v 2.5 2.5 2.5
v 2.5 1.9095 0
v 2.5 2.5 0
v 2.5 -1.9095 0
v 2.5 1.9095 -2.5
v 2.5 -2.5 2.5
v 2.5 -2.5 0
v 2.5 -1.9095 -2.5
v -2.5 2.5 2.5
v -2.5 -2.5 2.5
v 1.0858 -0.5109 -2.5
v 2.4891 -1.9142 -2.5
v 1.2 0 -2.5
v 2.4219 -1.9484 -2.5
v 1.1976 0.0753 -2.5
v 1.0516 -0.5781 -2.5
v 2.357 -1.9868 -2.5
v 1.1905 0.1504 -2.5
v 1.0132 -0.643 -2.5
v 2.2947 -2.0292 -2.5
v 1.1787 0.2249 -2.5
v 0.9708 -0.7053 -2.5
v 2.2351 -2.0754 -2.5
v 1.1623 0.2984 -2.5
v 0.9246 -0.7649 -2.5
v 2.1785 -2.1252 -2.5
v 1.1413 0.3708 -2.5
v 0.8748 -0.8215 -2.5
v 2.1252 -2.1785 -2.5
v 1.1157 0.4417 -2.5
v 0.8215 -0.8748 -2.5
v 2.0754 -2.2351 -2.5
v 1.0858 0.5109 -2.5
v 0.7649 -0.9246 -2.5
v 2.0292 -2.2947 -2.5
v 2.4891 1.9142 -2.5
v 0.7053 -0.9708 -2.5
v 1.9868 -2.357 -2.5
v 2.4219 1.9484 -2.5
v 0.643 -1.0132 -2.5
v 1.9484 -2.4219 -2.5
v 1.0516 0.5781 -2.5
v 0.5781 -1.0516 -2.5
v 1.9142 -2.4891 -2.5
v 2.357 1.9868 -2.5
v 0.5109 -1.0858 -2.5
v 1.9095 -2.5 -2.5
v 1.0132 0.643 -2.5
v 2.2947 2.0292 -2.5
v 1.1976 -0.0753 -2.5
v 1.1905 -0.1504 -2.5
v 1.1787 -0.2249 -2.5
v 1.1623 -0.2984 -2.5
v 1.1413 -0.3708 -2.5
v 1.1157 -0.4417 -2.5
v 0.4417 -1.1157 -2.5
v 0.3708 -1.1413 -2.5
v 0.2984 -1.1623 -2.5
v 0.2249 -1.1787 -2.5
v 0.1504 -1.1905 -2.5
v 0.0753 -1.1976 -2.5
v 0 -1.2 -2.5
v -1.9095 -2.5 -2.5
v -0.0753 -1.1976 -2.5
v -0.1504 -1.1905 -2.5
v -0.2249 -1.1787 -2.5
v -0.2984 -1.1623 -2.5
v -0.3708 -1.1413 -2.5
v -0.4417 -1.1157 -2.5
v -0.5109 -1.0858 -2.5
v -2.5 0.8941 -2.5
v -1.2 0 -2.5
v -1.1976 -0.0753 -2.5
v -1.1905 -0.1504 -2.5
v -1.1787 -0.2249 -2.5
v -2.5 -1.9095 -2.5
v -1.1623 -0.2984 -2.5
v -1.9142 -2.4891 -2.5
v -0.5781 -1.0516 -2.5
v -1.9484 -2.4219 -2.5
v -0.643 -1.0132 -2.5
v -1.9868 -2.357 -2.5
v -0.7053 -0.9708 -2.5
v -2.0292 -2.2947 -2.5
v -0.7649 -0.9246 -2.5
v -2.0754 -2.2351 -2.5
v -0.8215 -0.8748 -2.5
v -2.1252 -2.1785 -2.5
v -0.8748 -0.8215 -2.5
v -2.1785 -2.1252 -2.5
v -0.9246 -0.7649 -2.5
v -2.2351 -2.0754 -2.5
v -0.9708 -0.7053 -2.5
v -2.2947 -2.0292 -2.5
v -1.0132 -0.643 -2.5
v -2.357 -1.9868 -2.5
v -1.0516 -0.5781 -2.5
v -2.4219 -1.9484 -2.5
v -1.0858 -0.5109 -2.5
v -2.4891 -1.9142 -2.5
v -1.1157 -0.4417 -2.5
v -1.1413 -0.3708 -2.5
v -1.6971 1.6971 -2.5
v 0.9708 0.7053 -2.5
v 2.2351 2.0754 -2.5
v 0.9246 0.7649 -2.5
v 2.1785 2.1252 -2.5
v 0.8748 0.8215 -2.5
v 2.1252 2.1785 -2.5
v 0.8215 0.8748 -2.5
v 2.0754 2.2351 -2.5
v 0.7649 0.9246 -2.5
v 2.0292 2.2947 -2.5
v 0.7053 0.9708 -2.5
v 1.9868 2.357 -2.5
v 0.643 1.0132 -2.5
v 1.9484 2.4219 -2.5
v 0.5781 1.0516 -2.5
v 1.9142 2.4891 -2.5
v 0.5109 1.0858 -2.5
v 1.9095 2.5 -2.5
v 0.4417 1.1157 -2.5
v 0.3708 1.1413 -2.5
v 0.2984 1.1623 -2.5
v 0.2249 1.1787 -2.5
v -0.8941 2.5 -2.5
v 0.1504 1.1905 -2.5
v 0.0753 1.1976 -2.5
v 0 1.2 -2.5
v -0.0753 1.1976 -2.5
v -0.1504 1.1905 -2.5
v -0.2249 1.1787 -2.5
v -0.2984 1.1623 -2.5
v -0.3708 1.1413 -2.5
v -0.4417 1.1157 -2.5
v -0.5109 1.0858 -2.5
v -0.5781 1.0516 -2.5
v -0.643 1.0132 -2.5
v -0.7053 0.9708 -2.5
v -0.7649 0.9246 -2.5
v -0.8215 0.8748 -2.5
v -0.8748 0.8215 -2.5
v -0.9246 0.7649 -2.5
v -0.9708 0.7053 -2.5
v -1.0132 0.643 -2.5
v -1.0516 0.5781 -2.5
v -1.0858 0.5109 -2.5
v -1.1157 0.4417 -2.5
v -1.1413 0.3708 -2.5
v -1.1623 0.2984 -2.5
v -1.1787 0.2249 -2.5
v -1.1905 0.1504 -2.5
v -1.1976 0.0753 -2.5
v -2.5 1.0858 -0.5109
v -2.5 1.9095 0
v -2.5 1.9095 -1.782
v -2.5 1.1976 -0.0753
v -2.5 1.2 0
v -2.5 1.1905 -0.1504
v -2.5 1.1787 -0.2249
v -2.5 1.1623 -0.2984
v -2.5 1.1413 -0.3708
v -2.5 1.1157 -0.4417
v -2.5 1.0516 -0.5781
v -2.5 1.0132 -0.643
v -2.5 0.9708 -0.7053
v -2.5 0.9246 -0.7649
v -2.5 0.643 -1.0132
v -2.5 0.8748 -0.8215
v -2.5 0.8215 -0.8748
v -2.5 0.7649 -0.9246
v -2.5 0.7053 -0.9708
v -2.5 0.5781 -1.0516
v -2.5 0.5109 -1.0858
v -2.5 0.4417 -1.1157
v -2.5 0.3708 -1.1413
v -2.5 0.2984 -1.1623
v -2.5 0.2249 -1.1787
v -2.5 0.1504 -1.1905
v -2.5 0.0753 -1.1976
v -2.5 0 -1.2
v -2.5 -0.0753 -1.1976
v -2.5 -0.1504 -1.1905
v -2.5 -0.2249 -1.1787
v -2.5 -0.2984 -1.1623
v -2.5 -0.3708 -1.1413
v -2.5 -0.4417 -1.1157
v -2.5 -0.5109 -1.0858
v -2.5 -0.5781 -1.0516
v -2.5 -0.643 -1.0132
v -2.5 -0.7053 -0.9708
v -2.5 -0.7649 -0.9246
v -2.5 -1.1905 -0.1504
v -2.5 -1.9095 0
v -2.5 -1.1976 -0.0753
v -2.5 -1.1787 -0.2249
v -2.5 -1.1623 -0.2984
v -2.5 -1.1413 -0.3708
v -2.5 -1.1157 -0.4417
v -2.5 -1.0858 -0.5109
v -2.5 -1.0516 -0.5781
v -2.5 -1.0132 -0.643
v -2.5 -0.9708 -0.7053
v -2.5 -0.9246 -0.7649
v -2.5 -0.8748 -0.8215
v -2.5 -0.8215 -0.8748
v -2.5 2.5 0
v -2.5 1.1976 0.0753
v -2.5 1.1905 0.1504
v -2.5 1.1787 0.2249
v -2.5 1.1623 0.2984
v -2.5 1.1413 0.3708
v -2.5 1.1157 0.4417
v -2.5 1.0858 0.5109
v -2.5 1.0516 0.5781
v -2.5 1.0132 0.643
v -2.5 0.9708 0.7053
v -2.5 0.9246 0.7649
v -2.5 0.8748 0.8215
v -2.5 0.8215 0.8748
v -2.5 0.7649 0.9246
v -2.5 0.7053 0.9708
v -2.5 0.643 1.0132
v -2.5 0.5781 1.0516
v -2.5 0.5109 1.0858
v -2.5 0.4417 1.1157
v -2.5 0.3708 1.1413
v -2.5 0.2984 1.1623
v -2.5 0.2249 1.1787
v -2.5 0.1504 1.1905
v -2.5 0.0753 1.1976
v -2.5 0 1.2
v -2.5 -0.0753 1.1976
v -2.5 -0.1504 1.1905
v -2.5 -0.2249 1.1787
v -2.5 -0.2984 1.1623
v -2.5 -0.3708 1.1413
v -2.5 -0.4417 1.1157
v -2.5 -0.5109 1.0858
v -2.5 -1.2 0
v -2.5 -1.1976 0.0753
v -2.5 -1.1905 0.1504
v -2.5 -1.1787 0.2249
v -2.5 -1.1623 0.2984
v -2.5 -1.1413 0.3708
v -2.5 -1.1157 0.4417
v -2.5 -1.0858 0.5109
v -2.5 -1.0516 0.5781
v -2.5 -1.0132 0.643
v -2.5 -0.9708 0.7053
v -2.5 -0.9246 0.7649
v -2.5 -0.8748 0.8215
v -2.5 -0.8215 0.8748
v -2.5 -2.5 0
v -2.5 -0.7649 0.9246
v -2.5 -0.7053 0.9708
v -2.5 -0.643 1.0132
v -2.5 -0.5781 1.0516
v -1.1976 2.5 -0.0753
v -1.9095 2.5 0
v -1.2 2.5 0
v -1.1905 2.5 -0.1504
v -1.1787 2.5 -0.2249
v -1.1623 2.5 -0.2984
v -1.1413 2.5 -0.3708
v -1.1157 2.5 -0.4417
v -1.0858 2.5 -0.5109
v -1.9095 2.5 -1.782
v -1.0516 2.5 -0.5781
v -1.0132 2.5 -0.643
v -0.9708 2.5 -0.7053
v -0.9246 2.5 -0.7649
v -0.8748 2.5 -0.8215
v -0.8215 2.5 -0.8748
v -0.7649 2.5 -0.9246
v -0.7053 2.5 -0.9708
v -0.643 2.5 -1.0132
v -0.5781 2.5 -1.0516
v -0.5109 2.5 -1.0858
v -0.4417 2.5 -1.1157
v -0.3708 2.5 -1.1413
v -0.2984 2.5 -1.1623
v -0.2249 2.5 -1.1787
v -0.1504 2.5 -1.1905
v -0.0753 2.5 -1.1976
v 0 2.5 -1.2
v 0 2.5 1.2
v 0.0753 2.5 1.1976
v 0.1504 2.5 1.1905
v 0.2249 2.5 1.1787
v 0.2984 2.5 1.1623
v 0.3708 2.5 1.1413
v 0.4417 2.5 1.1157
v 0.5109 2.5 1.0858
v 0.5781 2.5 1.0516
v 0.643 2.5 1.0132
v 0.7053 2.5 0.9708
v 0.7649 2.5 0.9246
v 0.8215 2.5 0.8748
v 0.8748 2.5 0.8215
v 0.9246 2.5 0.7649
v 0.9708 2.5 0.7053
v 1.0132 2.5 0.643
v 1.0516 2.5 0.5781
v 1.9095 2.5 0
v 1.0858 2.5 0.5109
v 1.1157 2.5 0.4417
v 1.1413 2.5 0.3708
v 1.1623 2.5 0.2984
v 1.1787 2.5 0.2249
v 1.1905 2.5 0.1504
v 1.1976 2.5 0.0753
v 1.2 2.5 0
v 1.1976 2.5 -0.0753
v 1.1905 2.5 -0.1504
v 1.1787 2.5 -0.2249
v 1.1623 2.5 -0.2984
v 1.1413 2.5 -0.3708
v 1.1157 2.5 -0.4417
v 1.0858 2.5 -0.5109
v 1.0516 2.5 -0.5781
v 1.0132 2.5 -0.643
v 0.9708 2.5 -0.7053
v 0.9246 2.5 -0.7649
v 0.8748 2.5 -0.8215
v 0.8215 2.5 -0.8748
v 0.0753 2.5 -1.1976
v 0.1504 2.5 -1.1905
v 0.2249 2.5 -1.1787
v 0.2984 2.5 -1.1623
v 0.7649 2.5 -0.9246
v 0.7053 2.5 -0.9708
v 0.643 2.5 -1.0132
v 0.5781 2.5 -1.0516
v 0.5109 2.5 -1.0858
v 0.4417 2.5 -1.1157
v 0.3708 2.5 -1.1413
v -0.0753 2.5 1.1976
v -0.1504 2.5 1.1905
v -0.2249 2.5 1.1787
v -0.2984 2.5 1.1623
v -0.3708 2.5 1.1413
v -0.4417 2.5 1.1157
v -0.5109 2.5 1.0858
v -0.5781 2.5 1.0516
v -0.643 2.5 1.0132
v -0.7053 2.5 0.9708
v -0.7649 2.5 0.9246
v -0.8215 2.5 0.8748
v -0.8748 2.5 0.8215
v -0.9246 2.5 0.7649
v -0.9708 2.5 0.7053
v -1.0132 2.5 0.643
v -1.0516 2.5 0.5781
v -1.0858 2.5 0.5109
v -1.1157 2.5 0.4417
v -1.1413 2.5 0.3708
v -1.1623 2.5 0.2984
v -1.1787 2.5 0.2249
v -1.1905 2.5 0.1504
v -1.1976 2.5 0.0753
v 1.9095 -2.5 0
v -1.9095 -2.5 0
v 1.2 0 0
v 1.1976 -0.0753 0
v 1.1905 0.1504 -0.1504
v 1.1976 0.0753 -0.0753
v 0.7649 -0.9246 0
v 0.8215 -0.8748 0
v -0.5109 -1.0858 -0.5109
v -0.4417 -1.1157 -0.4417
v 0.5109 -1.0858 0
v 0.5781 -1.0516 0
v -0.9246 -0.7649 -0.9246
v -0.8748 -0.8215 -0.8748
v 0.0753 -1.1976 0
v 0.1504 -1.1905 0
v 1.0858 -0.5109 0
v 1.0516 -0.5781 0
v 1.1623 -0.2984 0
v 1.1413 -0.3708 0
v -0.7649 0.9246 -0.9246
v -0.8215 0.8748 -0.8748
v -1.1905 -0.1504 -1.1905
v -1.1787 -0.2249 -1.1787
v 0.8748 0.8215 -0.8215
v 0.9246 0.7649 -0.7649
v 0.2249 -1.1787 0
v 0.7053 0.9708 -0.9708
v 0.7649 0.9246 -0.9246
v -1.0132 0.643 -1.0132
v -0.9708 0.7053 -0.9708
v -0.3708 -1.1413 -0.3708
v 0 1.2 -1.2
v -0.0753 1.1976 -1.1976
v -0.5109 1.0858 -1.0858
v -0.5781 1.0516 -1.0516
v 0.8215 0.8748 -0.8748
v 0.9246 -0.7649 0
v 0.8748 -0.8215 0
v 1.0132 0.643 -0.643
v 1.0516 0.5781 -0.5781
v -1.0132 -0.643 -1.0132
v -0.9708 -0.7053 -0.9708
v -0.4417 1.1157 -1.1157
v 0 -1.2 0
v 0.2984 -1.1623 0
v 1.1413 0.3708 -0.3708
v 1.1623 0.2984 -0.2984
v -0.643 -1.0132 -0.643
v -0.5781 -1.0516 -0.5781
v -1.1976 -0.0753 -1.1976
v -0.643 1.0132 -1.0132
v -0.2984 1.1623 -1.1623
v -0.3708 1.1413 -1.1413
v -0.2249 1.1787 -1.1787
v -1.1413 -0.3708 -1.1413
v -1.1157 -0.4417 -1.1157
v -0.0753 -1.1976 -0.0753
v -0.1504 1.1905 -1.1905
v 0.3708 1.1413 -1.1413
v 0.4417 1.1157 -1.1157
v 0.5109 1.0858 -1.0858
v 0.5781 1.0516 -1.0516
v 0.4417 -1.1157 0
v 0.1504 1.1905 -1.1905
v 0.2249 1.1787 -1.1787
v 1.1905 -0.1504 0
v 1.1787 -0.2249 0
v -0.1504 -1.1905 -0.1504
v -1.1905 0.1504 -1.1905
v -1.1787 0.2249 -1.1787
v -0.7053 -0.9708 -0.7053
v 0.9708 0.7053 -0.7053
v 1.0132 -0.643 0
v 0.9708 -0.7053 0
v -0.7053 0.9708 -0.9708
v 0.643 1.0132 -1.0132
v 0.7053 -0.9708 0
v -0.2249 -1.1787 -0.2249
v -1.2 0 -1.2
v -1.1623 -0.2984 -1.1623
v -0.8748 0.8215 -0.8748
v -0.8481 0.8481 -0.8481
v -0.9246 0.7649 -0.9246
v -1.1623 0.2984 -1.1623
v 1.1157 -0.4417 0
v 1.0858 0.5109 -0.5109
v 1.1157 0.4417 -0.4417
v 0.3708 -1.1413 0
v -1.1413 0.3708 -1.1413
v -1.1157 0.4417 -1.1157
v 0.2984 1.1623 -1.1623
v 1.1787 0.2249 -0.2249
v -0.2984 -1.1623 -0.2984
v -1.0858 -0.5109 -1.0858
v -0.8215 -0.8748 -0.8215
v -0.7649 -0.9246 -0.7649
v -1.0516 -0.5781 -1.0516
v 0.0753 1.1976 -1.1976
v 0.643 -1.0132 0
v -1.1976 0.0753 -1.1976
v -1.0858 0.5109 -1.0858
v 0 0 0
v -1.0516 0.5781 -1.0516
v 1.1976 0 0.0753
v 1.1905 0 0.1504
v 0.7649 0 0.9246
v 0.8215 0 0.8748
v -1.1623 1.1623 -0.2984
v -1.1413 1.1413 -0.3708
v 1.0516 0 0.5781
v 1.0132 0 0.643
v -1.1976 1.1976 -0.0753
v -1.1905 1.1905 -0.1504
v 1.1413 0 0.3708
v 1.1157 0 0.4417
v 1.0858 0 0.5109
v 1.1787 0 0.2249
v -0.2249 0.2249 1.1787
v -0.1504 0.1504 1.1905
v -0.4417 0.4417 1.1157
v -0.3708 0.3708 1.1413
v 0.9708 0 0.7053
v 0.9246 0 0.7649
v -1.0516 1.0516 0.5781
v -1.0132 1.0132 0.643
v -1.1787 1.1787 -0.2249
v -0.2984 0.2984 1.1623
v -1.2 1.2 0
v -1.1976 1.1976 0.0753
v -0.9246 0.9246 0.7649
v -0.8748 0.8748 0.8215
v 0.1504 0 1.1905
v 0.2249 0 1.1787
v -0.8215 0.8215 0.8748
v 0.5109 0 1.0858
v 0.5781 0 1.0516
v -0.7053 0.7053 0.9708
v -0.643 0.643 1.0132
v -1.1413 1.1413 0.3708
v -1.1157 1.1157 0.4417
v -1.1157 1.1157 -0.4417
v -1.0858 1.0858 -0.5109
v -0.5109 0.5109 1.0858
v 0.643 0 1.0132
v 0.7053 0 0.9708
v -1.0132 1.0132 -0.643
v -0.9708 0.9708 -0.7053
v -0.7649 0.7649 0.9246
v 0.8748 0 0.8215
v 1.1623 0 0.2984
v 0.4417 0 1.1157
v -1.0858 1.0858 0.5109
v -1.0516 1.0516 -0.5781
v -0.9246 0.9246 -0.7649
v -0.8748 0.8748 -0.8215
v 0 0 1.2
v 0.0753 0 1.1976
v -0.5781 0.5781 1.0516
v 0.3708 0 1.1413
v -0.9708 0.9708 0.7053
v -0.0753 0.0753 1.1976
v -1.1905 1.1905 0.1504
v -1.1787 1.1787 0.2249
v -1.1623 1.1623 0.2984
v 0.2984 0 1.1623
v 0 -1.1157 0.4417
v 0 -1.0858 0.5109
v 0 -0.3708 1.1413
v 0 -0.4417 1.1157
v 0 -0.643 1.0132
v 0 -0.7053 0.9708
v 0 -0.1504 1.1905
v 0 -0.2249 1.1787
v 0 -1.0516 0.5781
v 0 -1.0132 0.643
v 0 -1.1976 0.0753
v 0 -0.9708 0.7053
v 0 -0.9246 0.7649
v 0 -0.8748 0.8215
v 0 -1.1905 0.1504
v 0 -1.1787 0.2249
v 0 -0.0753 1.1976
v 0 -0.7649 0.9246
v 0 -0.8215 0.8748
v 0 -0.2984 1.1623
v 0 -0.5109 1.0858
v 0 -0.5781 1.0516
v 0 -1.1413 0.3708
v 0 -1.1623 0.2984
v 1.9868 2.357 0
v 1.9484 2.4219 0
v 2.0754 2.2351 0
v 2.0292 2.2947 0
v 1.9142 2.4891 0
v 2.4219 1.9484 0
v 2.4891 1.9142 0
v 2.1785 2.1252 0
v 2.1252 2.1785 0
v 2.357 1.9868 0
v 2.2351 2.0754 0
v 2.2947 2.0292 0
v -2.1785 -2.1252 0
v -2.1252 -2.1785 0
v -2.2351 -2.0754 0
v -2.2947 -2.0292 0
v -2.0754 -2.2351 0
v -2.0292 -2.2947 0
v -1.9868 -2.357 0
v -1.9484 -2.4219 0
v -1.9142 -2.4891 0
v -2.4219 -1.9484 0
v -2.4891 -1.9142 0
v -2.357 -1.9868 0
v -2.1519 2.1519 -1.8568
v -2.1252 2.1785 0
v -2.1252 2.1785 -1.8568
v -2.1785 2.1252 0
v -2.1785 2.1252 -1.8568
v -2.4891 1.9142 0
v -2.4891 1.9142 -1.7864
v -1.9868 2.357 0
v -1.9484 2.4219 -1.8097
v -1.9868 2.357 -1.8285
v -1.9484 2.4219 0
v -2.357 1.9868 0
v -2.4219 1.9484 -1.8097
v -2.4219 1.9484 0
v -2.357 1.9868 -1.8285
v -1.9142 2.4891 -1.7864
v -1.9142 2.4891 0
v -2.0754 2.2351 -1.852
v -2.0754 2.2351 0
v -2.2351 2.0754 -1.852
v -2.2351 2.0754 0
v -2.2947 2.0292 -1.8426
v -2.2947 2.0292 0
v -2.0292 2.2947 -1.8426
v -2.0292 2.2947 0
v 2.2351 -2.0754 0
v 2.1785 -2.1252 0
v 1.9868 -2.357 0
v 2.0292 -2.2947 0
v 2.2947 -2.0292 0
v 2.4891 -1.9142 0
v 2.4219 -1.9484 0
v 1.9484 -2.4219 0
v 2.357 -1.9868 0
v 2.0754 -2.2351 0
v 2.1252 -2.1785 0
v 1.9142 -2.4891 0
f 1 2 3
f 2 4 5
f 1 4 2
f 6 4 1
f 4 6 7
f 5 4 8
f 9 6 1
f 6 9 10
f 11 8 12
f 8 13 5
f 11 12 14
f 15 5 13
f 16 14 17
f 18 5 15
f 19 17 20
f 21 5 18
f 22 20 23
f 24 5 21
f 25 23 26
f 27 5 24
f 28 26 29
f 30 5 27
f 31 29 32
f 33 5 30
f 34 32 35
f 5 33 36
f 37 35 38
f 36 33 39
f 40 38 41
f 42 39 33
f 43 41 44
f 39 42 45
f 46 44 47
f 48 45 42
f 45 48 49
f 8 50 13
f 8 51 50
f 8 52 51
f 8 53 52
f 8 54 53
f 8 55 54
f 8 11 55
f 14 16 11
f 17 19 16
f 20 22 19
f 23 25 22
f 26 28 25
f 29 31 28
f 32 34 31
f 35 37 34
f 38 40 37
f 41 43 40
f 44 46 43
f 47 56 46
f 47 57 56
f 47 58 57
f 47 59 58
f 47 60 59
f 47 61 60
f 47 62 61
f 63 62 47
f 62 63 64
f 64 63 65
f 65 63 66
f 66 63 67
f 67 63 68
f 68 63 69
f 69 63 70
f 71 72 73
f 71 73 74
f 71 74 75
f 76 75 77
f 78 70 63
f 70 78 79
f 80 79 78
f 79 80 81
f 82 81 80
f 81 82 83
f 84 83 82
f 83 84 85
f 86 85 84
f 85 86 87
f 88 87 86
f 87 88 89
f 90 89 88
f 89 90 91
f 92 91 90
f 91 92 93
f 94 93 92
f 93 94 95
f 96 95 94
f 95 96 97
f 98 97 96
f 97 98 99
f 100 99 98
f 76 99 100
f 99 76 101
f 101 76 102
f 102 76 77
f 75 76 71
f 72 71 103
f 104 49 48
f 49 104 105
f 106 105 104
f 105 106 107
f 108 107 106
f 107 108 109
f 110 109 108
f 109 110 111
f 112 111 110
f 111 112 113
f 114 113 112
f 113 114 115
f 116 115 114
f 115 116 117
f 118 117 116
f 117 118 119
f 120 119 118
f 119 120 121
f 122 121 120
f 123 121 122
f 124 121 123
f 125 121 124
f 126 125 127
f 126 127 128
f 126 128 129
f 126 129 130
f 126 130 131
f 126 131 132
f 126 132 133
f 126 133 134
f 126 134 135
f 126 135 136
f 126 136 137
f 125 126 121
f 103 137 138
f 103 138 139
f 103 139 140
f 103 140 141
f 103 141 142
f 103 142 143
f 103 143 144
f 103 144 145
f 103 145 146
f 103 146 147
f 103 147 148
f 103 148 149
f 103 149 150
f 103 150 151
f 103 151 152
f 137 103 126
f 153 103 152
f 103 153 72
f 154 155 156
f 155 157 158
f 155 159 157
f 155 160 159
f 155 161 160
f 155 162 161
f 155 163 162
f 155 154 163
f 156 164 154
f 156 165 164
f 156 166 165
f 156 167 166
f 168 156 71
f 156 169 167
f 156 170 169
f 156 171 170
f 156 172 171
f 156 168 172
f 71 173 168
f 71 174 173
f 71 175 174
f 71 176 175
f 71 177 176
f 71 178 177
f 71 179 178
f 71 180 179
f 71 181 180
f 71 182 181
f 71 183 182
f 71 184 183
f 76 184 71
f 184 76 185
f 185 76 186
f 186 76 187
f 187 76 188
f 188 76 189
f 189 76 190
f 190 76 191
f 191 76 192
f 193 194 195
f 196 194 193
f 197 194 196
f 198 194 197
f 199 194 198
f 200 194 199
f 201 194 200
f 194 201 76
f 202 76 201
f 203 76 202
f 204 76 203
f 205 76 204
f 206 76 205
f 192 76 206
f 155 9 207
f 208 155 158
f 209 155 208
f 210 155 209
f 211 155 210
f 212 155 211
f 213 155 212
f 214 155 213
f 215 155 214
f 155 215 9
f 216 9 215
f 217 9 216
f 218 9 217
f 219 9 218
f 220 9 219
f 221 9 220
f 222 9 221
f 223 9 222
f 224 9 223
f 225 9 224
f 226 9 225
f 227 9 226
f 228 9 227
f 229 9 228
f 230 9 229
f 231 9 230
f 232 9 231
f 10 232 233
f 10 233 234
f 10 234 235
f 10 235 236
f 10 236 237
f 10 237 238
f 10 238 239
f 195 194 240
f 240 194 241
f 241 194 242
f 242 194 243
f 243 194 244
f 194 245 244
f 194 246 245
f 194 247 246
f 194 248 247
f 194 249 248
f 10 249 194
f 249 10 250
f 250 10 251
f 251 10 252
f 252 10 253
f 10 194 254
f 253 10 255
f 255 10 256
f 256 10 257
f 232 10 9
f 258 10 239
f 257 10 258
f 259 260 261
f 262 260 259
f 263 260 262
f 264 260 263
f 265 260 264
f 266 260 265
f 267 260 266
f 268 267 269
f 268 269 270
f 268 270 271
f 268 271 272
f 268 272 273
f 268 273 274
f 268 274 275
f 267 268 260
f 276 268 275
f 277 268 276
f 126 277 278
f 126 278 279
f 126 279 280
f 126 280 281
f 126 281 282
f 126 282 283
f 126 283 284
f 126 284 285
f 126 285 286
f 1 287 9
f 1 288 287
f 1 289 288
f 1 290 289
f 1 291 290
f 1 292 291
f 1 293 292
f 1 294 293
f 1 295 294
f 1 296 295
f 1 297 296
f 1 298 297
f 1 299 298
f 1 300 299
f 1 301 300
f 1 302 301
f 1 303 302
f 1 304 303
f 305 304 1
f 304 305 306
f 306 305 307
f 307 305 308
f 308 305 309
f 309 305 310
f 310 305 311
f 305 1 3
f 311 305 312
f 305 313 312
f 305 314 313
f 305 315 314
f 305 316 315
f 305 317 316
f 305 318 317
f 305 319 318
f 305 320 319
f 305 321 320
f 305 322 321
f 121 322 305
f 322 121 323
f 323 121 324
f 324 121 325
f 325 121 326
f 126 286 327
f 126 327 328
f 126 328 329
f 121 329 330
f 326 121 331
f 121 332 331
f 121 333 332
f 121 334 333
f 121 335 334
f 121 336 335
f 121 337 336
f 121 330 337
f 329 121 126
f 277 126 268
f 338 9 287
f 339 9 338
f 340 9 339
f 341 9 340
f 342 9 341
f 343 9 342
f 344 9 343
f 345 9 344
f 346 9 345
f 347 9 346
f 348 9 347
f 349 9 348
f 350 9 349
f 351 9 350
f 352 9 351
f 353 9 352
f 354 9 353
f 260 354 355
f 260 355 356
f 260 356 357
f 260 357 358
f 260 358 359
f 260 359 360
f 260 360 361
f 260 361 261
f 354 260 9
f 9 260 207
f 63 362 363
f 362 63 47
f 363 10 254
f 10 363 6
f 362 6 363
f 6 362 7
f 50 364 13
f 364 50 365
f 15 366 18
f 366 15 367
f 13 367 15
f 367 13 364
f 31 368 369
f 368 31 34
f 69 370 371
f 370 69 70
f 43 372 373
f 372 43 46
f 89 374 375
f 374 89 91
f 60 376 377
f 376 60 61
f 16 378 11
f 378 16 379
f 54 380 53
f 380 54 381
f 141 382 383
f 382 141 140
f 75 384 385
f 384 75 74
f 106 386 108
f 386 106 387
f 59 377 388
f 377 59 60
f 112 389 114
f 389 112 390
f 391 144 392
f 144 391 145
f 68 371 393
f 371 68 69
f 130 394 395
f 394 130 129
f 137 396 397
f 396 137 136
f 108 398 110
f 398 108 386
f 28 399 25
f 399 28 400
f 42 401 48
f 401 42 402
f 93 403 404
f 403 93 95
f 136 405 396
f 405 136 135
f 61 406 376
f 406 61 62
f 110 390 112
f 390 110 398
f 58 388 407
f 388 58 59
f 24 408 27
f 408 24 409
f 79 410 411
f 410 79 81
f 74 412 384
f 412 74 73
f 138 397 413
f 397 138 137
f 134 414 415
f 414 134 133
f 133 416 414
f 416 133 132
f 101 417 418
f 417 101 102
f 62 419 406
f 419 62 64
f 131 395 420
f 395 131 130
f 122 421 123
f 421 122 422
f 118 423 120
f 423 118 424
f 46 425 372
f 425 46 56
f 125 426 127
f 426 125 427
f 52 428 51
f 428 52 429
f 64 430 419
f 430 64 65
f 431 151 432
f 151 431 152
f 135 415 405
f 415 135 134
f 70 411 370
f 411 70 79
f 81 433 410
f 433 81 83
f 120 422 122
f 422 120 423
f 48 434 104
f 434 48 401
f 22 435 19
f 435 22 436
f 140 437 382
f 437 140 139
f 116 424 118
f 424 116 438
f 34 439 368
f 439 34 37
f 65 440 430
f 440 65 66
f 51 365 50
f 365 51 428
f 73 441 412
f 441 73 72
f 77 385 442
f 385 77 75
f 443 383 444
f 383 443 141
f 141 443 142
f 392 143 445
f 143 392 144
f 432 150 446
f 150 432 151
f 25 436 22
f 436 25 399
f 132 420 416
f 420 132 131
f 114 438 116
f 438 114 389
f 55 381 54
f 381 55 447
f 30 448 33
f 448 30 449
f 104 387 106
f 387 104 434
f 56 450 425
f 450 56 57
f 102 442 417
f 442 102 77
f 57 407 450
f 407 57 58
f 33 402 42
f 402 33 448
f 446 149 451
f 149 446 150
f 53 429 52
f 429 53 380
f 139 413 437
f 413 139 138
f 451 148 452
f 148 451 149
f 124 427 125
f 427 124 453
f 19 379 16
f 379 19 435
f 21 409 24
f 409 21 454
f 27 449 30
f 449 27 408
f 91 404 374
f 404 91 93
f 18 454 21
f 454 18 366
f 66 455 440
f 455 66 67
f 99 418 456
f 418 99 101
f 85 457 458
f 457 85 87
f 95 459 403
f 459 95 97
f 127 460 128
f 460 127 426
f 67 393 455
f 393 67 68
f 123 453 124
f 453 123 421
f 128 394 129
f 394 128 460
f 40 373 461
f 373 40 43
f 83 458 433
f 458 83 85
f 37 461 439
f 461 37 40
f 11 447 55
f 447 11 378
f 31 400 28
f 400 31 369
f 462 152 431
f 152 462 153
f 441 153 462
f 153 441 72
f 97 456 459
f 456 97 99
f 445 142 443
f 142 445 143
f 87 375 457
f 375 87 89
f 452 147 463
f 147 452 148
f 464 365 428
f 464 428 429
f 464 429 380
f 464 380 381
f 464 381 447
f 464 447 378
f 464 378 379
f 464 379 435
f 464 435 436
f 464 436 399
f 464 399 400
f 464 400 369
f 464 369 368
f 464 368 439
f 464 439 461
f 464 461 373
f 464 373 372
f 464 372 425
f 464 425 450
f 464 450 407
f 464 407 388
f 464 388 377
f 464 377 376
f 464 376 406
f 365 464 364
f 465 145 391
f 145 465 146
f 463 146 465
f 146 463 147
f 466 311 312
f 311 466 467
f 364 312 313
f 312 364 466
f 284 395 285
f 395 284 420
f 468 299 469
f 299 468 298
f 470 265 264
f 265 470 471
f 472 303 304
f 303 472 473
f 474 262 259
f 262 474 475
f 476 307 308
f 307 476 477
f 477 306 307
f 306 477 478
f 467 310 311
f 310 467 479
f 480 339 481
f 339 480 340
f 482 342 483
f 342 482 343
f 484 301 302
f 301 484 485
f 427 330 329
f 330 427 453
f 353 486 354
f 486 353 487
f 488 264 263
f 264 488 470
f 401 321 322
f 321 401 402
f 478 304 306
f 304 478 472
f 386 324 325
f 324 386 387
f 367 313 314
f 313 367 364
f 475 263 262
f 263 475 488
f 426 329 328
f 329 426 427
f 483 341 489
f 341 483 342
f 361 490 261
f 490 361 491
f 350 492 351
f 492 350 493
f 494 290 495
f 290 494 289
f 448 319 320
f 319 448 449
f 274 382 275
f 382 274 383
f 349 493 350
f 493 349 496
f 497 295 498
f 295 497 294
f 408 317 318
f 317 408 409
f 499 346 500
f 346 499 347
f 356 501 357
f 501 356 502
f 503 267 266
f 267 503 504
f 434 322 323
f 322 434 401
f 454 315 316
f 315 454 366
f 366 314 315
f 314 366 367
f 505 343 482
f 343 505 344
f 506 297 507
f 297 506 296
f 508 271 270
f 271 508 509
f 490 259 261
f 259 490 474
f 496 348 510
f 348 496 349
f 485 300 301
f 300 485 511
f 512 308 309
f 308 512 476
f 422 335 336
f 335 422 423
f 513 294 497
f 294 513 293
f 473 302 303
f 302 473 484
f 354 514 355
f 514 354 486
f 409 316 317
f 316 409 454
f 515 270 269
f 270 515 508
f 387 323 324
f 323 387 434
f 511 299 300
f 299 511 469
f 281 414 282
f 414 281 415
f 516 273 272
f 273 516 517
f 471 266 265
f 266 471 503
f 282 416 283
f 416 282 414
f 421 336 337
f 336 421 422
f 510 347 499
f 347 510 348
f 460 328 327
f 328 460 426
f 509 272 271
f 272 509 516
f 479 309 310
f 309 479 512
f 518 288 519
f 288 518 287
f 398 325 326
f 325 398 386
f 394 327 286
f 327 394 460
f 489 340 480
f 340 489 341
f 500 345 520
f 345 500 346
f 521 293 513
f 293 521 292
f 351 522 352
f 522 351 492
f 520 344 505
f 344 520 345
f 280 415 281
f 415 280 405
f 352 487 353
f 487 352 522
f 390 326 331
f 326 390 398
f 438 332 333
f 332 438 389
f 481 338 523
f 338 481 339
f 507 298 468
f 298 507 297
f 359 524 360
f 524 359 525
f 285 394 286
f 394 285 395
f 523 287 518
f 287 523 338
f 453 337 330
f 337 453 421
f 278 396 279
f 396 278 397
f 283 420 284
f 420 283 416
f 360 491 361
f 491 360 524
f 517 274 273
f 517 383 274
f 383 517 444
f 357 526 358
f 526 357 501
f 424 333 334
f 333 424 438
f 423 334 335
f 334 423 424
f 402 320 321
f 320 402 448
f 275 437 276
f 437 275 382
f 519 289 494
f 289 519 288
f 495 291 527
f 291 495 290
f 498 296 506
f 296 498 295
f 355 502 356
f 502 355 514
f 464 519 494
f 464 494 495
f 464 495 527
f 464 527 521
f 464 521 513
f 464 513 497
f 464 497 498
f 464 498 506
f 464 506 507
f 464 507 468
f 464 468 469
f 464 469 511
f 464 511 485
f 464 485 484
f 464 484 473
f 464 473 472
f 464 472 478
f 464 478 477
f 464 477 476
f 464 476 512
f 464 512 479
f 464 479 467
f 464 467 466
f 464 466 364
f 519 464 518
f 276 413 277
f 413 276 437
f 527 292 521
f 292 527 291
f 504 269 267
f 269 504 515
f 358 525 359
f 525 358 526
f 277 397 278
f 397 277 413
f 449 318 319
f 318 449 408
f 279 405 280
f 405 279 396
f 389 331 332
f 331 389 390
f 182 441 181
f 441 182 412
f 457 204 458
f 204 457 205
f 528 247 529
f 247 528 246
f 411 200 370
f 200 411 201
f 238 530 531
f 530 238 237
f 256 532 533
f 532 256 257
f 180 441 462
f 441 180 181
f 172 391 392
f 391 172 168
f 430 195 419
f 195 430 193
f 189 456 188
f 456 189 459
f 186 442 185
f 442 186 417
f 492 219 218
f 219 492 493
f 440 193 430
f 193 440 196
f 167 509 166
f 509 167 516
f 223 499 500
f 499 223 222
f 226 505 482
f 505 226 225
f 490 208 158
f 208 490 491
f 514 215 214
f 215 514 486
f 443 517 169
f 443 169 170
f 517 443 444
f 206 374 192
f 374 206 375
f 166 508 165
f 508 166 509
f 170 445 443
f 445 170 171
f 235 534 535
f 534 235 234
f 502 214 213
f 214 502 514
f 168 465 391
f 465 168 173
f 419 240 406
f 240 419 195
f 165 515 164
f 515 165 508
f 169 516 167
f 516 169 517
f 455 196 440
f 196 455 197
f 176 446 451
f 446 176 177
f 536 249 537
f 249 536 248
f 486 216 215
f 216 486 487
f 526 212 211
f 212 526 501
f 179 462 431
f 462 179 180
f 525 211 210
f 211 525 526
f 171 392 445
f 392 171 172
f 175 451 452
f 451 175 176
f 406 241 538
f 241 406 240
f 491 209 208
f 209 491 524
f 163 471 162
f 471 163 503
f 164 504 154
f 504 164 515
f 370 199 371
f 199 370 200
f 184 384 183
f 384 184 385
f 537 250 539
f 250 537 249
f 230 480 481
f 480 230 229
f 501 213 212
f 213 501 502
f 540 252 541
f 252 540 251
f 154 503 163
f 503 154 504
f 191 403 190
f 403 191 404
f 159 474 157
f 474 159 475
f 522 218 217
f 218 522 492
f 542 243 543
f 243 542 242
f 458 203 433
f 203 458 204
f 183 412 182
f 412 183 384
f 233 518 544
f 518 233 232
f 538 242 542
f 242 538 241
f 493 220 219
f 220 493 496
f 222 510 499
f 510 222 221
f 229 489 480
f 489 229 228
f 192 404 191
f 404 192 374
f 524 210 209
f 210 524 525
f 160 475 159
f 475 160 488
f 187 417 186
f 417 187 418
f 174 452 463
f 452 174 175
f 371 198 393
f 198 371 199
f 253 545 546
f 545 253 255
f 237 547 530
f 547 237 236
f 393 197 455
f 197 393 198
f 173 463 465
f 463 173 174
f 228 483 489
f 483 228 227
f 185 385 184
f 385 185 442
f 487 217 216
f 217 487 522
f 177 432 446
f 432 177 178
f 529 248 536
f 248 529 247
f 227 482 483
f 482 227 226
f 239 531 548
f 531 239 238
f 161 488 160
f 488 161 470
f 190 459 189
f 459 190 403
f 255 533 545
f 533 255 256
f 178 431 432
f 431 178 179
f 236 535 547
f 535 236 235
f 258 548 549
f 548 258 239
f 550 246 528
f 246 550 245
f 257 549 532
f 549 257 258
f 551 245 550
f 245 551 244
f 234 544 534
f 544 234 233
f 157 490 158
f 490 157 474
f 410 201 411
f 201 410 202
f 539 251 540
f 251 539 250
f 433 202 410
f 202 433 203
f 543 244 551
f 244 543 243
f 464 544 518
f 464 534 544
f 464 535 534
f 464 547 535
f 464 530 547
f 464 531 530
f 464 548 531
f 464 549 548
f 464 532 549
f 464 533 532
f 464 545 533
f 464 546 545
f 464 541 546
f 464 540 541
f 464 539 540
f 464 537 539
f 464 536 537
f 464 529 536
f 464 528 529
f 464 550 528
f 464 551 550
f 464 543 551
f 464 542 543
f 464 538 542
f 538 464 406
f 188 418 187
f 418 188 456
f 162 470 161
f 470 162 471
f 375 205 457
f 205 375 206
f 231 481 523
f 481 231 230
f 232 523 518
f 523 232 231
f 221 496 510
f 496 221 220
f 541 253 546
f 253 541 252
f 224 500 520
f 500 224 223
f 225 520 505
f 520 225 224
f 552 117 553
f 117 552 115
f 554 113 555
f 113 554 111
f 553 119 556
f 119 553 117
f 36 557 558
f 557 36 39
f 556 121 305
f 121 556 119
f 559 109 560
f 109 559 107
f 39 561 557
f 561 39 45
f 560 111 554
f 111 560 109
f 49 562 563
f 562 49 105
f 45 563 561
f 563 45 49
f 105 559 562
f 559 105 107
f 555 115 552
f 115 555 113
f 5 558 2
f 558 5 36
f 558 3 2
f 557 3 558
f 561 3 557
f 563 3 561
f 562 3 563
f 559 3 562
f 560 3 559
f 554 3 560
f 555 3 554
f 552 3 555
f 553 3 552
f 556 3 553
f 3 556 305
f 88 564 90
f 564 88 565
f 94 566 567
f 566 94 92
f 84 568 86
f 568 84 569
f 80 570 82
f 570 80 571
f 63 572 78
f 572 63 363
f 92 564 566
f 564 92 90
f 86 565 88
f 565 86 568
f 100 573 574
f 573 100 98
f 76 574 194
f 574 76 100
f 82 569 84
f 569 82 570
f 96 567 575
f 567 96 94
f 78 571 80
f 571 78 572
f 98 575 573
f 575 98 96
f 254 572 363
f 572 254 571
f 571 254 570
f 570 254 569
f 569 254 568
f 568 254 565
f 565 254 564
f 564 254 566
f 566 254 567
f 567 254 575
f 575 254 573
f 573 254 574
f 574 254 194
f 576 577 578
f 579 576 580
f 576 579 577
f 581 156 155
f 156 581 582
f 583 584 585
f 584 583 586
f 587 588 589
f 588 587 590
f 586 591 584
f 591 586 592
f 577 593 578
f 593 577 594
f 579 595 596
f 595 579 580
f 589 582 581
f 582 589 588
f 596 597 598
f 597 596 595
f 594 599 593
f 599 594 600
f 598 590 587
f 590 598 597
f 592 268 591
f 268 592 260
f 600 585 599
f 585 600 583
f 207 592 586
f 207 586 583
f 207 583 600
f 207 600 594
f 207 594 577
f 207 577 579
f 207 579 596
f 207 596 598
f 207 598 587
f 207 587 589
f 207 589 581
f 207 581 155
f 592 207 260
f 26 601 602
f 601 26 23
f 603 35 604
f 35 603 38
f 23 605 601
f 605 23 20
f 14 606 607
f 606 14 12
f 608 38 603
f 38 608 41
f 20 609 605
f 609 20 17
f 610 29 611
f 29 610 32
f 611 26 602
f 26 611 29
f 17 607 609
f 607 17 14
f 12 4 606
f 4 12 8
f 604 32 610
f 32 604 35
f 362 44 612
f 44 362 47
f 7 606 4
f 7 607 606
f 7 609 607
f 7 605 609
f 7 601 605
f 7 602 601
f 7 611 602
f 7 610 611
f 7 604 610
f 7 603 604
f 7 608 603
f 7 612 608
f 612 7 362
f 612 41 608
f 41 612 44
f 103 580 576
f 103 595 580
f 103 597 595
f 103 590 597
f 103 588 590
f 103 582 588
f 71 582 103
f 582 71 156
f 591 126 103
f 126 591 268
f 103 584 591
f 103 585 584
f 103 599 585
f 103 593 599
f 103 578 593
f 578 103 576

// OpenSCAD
difference(){   
cube(size = [5,5,5], center = true, $fn=100);
translate(v=[0,0,-3])
cylinder(h = 6, r = 1.2, center = true, $fn=100);
rotate([90,0,0])
translate(v=[0,0,-3])
cylinder(h = 6, r = 1.2, center = true, $fn=100);
rotate([0,90,0])
translate(v=[0,0,-3])
cylinder(h = 6, r = 1.2, center = true, $fn=100);
translate(v=[3,3,-3])
cylinder(h = 6, r = 1.2, center = true, $fn=100);
translate(v=[-3,-3,-3])
cylinder(h = 6, r = 1.2, center = true, $fn=100);
translate(v=[-3,3,-3])
cylinder(h = 6, r = 1.2, center = true, $fn=100);
translate(v=[3,-3,-3])
cylinder(h = 6, r = 1.2, center = true, $fn=100);
translate([-2,2,-4.9]) rotate([45,-45,-45]) cube(size=[2,2,2]);
}
